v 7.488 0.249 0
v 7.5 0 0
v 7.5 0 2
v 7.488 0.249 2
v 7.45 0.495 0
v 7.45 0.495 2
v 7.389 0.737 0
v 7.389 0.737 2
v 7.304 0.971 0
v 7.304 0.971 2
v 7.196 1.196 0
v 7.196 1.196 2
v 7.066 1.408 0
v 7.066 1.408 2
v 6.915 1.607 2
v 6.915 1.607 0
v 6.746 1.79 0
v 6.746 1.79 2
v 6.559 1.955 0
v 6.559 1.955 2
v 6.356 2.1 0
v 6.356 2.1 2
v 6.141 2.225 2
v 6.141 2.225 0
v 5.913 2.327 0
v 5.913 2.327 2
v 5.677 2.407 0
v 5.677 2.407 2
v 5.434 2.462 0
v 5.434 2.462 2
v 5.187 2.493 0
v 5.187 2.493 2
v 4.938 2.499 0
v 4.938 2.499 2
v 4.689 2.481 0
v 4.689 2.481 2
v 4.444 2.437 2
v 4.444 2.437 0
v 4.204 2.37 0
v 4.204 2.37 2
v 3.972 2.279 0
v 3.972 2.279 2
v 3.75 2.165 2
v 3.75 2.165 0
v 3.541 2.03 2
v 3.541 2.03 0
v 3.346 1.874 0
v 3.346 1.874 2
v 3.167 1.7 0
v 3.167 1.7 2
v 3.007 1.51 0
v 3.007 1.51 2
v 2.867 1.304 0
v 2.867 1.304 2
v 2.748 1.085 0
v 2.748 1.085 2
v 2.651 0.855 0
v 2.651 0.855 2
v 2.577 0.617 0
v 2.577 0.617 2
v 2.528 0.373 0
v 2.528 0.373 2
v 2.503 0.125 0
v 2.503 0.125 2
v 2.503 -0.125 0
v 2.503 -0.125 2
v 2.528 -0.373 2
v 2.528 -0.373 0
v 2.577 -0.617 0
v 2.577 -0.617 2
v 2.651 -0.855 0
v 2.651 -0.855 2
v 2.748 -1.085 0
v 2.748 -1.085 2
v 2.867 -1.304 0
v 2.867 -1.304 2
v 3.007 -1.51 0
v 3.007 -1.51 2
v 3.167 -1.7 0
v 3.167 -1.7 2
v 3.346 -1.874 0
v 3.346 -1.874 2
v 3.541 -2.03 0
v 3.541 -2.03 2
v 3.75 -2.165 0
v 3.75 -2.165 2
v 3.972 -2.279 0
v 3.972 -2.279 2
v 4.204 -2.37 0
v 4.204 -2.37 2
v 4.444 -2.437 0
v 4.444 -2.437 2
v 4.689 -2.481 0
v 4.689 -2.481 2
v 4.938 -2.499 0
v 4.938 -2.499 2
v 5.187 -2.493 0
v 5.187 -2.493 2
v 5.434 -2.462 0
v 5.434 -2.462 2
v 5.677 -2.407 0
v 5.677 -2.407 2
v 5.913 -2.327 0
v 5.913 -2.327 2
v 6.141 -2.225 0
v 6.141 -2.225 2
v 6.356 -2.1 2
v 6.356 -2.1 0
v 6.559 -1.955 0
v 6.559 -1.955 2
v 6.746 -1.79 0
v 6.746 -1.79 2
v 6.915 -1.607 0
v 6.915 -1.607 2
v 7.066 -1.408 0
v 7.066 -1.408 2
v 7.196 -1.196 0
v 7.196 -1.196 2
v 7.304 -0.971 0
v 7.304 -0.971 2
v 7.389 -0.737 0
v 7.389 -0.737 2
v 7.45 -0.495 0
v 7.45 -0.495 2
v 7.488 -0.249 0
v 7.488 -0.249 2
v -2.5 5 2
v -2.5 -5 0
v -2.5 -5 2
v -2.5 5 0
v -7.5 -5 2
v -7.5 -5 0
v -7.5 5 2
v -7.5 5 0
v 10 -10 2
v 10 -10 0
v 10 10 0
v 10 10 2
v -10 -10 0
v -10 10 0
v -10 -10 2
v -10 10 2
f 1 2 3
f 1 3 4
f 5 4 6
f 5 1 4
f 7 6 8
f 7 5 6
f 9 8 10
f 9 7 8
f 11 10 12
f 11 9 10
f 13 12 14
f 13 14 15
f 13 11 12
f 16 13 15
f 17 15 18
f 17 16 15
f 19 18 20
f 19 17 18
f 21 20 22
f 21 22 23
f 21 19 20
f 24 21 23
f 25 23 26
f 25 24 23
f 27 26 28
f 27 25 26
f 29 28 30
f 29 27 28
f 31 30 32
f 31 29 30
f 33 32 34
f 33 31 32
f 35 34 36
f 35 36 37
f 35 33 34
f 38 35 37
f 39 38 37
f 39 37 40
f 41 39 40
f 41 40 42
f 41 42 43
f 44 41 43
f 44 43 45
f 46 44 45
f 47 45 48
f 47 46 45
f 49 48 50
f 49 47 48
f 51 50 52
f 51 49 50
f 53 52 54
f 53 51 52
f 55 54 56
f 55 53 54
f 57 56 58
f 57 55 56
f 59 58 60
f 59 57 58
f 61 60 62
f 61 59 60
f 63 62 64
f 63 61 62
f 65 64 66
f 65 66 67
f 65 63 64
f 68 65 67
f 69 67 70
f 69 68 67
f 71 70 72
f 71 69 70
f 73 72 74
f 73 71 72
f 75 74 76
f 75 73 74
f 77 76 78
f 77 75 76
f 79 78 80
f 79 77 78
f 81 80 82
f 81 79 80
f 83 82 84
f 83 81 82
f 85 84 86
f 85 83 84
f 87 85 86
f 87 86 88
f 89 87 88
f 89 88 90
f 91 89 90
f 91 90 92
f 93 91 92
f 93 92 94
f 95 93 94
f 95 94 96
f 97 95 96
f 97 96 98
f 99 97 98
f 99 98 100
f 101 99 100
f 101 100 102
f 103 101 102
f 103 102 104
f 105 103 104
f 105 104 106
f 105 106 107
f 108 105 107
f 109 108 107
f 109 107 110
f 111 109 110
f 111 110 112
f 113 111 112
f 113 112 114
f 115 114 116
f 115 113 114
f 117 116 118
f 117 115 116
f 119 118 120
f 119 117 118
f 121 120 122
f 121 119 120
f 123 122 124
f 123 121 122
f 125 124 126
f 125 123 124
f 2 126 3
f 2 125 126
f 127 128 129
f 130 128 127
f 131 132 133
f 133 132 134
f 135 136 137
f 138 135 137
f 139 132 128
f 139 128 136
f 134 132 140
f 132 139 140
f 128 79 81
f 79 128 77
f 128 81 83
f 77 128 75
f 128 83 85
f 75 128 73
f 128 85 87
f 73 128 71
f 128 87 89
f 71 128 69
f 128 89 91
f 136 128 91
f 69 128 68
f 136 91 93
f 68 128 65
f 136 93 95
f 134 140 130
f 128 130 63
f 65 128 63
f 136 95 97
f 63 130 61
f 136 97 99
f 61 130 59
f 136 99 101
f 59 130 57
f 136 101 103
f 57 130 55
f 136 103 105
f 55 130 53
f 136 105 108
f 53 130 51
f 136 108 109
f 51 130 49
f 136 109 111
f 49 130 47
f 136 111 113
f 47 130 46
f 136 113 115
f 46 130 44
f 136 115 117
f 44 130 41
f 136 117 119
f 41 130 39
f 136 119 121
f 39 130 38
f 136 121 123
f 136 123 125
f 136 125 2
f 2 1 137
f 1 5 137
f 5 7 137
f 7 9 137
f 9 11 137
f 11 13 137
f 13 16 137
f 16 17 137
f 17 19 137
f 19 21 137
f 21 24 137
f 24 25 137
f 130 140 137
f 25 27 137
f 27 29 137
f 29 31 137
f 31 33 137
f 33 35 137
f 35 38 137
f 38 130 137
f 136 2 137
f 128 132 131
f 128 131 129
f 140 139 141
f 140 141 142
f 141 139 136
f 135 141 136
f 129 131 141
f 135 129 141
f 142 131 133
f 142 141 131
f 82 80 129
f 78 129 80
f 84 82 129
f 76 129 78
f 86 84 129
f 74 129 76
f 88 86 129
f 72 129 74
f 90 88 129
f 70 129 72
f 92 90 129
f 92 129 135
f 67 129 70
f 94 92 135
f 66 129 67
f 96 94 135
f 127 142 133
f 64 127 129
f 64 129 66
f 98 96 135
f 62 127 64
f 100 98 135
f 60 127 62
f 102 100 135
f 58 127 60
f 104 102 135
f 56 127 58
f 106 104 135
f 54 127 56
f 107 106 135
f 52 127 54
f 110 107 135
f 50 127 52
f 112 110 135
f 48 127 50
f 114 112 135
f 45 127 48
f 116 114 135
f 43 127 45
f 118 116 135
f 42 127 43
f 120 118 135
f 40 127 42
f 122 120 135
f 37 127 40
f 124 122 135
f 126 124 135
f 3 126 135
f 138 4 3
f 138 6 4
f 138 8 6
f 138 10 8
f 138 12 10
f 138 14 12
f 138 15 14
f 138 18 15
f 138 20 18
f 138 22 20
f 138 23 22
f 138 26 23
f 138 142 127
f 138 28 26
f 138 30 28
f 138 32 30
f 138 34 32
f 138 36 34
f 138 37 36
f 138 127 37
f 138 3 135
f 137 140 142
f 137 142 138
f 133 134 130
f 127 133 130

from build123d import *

# Parameters (mm, degrees)
F0_W     = 20
F0_H     = 20
F0_W_2   = 5
F0_H_2   = 10
F0_R     = 2.5
F1_DEPTH = 2


with BuildPart() as f1:
    # F0 (on Top) → F1 (new body)
    with BuildSketch(Plane.XY):
        Rectangle(F0_W, F0_H)
        with Locations((-5, 0)):
            Rectangle(F0_W_2, F0_H_2, mode=Mode.SUBTRACT)
        with Locations((5, 0)):
            Circle(F0_R, mode=Mode.SUBTRACT)
    extrude(amount=F1_DEPTH)


solid = f1.part
